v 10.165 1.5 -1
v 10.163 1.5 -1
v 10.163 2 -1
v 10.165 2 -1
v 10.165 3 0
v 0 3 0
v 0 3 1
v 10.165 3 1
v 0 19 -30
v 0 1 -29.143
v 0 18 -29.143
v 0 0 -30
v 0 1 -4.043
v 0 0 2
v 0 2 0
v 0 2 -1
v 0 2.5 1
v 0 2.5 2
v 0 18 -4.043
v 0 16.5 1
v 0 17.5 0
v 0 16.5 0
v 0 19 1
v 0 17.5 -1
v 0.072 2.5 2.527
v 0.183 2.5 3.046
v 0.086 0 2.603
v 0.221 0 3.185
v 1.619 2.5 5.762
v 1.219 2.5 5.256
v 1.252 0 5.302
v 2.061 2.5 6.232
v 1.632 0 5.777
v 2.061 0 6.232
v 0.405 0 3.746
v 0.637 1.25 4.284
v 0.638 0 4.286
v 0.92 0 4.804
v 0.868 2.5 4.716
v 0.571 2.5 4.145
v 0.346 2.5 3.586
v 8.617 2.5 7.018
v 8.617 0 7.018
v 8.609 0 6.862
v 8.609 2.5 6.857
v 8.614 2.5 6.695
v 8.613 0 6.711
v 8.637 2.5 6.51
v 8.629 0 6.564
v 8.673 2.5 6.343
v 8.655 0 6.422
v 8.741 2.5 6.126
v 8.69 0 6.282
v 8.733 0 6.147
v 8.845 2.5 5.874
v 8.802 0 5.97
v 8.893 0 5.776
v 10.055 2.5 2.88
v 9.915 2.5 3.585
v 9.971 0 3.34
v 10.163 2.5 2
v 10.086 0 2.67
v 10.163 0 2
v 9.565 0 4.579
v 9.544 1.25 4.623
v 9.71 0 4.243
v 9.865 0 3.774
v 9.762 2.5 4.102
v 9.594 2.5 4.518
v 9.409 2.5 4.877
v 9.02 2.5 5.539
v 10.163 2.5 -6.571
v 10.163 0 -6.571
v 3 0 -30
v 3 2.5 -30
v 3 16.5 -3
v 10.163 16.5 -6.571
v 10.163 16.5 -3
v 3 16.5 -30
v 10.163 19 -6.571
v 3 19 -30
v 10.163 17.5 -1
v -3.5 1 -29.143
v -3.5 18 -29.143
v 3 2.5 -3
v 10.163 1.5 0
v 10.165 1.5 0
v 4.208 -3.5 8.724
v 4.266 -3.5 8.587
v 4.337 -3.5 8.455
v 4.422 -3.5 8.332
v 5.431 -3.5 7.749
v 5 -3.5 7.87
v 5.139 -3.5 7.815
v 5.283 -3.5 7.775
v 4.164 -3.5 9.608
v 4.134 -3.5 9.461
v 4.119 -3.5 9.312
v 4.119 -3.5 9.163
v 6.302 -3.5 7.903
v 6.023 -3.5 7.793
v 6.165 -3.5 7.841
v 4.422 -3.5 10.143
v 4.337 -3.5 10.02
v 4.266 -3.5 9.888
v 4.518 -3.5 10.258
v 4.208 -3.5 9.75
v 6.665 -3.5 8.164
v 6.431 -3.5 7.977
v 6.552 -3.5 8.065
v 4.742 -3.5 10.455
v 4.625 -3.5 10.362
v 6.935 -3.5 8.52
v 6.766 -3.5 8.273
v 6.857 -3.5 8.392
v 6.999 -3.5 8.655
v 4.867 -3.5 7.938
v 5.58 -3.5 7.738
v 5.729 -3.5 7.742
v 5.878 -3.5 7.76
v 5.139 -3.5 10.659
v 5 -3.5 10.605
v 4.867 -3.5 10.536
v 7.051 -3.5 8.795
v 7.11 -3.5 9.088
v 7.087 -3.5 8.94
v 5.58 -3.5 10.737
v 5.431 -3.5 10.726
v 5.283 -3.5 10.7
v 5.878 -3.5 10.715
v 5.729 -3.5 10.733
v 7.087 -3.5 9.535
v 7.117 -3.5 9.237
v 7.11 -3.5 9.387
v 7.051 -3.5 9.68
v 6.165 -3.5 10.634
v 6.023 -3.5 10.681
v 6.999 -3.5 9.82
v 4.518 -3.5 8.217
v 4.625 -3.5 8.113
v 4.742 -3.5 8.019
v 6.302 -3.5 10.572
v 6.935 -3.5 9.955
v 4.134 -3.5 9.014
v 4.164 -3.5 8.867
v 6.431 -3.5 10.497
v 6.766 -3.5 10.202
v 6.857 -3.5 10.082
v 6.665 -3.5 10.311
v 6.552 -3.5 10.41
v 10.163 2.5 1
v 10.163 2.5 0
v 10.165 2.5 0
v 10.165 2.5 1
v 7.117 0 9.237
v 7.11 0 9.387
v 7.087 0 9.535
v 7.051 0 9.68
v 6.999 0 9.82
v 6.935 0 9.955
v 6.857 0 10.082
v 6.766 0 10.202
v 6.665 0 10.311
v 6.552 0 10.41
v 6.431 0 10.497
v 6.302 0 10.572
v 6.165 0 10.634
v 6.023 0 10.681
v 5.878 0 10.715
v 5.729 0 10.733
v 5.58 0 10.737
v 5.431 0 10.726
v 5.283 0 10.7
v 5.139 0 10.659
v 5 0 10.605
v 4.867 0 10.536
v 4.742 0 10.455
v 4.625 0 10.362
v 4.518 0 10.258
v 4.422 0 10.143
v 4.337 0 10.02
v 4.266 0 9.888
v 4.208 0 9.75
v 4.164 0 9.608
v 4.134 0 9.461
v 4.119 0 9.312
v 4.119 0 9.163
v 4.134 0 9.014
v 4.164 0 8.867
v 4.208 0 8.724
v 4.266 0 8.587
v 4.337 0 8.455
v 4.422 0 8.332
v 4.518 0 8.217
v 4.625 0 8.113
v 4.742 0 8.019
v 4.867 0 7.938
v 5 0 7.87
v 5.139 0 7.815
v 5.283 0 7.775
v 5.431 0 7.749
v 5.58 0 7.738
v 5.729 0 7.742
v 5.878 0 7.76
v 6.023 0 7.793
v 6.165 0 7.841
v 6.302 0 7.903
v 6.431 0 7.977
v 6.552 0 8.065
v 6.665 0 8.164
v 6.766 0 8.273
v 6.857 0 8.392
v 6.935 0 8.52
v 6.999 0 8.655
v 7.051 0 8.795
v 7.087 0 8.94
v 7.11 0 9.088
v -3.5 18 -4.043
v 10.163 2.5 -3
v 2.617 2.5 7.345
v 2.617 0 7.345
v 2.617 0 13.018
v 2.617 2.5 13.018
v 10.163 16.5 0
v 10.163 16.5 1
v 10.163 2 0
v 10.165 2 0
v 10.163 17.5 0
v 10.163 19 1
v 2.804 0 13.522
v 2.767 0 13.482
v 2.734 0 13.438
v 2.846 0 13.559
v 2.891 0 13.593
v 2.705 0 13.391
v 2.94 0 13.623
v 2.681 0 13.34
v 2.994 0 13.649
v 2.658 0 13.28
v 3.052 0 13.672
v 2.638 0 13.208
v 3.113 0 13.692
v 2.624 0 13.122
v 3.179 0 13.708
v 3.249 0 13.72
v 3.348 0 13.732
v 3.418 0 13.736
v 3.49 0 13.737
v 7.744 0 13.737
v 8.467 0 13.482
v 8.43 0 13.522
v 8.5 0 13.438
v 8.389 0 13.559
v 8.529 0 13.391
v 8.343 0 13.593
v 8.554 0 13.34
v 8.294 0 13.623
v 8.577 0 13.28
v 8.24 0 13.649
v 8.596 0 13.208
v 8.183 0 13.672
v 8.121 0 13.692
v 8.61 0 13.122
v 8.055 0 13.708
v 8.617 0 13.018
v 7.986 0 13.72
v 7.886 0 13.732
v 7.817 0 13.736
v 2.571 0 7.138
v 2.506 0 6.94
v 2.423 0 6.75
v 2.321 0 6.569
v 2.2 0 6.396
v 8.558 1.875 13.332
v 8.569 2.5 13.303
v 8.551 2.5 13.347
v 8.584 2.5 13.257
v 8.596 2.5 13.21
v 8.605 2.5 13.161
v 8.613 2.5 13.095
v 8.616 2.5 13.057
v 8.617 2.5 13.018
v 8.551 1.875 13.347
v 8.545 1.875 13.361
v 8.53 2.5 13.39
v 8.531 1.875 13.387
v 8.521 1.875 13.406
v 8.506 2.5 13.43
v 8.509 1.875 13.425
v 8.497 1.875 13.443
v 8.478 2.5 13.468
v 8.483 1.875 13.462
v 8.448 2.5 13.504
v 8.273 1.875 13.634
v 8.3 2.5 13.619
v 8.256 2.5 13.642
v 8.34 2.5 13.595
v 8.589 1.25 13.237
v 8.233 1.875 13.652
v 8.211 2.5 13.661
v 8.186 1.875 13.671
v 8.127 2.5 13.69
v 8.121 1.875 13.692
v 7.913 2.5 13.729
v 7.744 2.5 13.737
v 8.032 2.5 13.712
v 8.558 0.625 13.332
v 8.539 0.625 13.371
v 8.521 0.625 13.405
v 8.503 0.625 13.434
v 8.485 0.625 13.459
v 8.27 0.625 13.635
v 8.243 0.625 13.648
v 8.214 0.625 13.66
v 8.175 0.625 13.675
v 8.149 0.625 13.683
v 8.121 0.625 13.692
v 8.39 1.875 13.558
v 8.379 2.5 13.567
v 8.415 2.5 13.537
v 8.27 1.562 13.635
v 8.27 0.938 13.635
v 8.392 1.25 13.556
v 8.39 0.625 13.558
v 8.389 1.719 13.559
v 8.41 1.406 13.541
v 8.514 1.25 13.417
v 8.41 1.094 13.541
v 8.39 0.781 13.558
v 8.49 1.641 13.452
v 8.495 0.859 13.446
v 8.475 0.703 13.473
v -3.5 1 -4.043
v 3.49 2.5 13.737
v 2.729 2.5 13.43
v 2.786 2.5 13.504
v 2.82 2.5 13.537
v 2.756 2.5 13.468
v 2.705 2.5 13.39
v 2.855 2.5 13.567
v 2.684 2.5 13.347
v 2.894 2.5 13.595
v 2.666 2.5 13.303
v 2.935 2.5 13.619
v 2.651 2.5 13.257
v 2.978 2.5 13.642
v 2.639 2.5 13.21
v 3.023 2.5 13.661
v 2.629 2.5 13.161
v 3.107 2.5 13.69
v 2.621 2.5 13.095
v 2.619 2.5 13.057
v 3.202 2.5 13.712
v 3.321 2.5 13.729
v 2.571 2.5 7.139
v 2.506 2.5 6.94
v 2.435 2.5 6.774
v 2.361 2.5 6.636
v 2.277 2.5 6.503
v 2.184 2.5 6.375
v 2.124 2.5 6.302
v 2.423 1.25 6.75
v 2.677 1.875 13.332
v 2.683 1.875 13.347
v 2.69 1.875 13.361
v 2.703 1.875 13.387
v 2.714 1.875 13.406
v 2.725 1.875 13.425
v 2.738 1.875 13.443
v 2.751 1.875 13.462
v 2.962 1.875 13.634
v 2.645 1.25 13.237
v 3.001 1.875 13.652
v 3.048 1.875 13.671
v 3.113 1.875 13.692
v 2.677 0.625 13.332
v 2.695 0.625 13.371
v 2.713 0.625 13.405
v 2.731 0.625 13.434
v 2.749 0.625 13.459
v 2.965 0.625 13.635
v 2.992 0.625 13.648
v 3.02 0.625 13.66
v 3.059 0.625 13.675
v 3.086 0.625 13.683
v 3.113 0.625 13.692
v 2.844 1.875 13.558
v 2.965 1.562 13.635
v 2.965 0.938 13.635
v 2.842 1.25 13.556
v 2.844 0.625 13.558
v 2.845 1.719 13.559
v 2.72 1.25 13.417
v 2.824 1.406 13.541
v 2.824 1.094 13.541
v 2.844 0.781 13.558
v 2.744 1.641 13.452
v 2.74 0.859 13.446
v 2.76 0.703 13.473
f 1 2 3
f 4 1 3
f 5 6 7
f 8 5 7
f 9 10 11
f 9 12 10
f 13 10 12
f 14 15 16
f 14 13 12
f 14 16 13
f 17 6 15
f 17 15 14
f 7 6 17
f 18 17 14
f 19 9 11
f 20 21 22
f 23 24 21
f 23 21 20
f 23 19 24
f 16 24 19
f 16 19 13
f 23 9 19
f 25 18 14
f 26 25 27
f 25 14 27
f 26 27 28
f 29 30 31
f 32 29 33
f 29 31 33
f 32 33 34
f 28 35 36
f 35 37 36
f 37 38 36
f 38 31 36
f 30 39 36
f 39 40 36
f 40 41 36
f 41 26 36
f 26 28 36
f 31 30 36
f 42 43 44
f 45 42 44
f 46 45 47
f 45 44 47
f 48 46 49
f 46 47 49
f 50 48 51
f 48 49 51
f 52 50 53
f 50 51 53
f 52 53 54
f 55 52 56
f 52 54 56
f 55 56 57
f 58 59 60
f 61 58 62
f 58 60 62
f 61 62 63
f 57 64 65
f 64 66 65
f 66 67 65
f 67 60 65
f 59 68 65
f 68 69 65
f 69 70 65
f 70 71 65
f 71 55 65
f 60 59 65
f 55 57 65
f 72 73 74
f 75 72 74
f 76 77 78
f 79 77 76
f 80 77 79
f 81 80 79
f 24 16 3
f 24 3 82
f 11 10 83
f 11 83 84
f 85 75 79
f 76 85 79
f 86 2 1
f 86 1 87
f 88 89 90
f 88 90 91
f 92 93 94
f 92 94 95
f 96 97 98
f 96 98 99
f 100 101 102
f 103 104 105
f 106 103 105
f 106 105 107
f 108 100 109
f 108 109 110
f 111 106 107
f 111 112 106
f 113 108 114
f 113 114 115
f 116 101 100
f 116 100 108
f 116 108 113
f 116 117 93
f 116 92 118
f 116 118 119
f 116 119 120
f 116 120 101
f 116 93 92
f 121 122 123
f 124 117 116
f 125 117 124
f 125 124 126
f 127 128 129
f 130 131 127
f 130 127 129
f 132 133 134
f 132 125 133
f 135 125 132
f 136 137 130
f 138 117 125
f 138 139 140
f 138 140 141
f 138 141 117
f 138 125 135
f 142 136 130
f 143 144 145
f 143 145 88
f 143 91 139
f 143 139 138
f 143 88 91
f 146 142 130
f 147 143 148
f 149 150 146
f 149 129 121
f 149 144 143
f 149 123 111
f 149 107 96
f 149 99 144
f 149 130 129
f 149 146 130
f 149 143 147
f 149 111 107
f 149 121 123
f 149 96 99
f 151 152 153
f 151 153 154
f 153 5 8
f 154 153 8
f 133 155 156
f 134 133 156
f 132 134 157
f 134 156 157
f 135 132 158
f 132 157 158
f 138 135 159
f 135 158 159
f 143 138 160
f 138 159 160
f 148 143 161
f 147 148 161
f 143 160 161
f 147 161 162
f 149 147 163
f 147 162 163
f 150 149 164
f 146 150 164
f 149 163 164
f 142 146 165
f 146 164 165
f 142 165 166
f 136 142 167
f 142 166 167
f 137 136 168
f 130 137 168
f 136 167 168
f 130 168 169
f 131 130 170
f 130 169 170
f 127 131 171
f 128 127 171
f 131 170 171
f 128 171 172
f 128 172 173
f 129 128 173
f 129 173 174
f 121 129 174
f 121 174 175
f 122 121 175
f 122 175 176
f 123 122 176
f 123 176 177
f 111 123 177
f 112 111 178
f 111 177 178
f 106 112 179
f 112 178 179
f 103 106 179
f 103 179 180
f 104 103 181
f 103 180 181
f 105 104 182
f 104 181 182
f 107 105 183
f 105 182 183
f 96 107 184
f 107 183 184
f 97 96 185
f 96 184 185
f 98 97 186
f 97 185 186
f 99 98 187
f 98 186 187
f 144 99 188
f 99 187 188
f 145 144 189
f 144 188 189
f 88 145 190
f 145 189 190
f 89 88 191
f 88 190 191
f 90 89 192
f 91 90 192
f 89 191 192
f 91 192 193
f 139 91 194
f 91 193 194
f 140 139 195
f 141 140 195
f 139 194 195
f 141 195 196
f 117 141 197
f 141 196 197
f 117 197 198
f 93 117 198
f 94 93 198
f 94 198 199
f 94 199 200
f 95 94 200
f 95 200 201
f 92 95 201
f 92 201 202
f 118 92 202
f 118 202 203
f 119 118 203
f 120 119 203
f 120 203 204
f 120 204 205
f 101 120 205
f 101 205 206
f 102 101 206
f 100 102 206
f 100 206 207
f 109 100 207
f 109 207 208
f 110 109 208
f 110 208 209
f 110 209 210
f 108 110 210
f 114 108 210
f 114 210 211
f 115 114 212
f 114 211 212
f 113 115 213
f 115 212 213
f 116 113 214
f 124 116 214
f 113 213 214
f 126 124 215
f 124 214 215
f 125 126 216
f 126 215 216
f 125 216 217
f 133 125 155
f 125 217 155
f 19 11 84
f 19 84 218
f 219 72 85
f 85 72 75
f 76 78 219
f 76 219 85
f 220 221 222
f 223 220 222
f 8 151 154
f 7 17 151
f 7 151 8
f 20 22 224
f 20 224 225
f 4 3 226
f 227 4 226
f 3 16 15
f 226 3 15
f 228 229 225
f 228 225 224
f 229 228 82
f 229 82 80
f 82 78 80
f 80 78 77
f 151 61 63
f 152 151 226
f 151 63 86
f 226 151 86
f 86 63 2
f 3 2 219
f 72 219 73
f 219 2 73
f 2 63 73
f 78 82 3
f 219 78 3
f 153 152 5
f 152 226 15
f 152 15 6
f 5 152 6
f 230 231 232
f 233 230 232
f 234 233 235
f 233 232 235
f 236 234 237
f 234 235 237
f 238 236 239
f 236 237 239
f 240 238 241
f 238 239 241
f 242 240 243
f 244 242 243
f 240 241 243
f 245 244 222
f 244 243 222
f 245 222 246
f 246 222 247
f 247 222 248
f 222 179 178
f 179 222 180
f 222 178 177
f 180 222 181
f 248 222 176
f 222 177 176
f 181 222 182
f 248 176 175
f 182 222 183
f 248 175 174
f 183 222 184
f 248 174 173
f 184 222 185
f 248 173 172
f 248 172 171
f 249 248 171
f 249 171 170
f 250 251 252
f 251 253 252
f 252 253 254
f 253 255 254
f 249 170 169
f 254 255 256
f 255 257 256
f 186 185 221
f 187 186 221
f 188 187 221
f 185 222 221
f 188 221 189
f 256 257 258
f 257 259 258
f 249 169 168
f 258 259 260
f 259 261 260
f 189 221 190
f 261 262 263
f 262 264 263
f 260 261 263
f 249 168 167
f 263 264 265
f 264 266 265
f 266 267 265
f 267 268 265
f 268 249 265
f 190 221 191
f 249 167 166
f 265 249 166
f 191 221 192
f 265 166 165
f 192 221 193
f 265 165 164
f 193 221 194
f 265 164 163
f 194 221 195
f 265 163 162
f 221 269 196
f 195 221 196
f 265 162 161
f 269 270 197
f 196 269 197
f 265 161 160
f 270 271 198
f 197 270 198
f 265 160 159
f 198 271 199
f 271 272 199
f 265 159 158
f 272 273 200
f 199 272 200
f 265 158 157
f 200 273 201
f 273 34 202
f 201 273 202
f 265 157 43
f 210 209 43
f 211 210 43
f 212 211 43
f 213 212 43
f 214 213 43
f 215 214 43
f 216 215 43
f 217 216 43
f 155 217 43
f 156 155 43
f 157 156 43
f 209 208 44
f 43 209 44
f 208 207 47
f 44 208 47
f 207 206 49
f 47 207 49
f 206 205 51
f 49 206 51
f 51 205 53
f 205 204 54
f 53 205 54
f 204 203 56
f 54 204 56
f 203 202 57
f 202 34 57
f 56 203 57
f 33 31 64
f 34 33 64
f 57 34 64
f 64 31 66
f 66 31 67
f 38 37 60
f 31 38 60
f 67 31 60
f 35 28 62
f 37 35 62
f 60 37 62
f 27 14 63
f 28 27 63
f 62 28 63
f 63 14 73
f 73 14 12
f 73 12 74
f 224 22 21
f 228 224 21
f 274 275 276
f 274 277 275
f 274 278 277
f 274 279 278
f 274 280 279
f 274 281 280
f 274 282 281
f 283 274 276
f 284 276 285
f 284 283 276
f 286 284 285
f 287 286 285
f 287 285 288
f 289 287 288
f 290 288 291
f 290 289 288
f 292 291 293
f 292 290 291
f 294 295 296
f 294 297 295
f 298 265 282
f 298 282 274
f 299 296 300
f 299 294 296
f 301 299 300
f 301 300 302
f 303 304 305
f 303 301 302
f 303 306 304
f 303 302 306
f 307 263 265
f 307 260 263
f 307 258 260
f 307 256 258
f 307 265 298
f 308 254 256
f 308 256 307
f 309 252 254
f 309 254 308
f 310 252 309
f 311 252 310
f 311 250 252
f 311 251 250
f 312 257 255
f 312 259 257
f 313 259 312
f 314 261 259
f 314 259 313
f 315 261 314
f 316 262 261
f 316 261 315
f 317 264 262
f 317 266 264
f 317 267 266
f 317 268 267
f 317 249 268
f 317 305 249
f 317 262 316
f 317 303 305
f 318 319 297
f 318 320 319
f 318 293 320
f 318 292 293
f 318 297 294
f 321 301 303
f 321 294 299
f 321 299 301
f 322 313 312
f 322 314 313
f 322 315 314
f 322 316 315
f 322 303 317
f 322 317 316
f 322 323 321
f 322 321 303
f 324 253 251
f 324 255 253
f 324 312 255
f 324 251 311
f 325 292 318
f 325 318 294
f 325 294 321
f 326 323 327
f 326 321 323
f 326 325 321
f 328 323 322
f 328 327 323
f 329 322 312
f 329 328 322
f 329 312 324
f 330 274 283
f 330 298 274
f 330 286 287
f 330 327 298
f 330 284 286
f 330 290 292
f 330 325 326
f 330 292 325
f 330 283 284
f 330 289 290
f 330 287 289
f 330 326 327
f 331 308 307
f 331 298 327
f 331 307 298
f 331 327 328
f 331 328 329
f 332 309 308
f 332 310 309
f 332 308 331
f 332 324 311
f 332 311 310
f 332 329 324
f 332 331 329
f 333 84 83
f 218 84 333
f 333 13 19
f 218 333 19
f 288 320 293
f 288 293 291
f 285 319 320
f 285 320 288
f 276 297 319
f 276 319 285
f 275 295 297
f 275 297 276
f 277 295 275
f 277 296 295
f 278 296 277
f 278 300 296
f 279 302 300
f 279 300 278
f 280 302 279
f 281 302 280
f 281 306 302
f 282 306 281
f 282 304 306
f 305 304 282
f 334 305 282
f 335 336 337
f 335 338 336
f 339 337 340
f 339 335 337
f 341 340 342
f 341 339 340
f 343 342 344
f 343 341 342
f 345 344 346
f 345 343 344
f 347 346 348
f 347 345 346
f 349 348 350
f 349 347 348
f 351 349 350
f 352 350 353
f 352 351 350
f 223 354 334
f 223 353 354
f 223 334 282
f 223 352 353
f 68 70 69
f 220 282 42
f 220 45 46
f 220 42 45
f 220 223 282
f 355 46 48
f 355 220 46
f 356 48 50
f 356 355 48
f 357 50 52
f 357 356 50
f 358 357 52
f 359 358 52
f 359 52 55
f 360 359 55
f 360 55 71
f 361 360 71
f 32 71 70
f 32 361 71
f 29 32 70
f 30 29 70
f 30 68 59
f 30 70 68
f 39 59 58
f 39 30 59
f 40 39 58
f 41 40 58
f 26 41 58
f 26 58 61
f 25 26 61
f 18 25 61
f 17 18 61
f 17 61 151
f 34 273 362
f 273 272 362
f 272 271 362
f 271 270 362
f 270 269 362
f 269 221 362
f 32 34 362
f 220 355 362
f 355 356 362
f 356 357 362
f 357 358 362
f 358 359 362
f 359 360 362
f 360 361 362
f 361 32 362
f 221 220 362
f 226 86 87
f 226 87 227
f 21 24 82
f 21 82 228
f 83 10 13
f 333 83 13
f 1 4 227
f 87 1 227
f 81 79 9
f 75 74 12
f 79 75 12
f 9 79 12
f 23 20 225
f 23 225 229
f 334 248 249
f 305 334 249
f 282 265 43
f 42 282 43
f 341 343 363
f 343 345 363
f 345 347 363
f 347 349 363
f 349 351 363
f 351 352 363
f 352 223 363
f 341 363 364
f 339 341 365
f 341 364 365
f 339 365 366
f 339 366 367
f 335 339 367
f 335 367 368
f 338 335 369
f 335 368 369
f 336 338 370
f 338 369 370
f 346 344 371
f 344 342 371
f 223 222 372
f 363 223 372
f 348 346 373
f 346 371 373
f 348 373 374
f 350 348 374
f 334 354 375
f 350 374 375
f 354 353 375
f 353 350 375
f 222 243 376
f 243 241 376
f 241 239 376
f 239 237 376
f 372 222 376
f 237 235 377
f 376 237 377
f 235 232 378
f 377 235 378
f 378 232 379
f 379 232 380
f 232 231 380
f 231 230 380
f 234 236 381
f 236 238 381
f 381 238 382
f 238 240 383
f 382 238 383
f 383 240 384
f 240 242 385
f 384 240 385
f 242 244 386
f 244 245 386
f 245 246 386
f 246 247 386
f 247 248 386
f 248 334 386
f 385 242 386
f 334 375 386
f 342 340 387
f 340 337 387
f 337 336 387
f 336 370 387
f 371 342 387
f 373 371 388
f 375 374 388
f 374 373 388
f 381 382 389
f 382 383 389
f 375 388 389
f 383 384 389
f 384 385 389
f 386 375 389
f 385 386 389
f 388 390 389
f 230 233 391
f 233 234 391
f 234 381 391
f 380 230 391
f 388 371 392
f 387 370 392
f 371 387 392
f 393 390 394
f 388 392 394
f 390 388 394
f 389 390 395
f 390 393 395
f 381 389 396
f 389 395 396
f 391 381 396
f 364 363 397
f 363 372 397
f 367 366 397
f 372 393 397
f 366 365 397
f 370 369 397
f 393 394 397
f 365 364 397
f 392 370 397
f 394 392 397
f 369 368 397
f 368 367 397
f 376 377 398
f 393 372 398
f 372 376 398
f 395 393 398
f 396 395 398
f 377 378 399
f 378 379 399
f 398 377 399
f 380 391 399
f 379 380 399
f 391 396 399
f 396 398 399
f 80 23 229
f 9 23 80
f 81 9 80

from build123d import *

# Parameters (mm, degrees)
SALIENTE_EXTRUIR1_DEPTH = 19
CROQUIS2_W              = 9.87256946
CROQUIS2_H              = 14
CORTAR_EXTRUIR1_DEPTH   = 27
CROQUIS13_W             = 25.1
CROQUIS13_H             = 17
SALIENTE_EXTRUIR5_DEPTH = 3.5
CORTAR_EXTRUIR3_DEPTH   = 23
CROQUIS14_W             = 1
CROQUIS14_H             = 1
CORTAR_EXTRUIR4_DEPTH   = 23
CROQUIS15_R             = 1.5
SALIENTE_EXTRUIR6_DEPTH = 3.5
CROQUIS16_W             = 1
CROQUIS16_H             = 0.5
SALIENTE_EXTRUIR7_DEPTH = 10.165


with BuildPart() as part:
    # Croquis1 → Saliente-Extruir1 (new body)
    with BuildSketch(Plane(origin=(0, 0, 0), x_dir=(1, 0, 0), z_dir=(0, 1, 0))):
        with BuildLine():
            Line((0, 30), (0, 0))
            Line((0, 0), (0, -2))
            add(Edge.make_bspline(
                [(0, -2), (0.244064913, -4.453043064), (2.060905279, -6.231862145)],
                knots=[0, 0, 0, 1, 1, 1], degree=2))
            add(Edge.make_bspline(
                [(2.060905279, -6.231862145), (2.507004014, -6.712573557), (2.617207224, -7.344647716)],
                knots=[0, 0, 0, 1, 1, 1], degree=2))
            Line((2.617207224, -7.344647716), (2.617207224, -13.018311654))
            add(Edge.make_bspline(
                [(2.617207224, -13.018311654), (2.630895377, -13.73499915), (3.489917654, -13.737380921)],
                knots=[0, 0, 0, 1, 1, 1], degree=2))
            Line((3.489917654, -13.737380921), (7.744496795, -13.737380921))
            add(Edge.make_bspline(
                [(8.617207224, -13.018311654), (8.603519071, -13.73499915), (7.744496795, -13.737380921)],
                knots=[0, 0, 0, 1, 1, 1], degree=2))
            Line((8.617207224, -13.018311654), (8.617207224, -7.018311654))
            add(Edge.make_bspline(
                [(8.617207224, -7.018311654), (8.52941254, -6.066211773), (9.815332332, -4.707225326), (10.076873528, -2.886889338), (10.163106766, -2)],
                knots=[0, 0, 0, 0, 0.490316762, 1, 1, 1, 1], degree=3))
            Line((10.163106766, -2), (10.163106766, 0))
            Line((10.163106766, 0), (10.163106766, 6.570533479))
            Line((10.163106766, 6.570533479), (3, 30))
            Line((3, 30), (0, 30))
        make_face()
    extrude(amount=SALIENTE_EXTRUIR1_DEPTH)

    # Croquis2 → Cortar-Extruir1 (cut)
    with BuildSketch(Plane(origin=(0, 0, -30), x_dir=(-1, 0, 0), z_dir=(0, 0, -1))):
        with Locations((-7.93628473, 9.5)):
            Rectangle(CROQUIS2_W, CROQUIS2_H)
    extrude(amount=-CORTAR_EXTRUIR1_DEPTH, mode=Mode.SUBTRACT)

    # Croquis13 → Saliente-Extruir5 (add)
    with BuildSketch(Plane.ZY):
        with Locations((-16.592912937, 9.5)):
            Rectangle(CROQUIS13_W, CROQUIS13_H)
    extrude(amount=SALIENTE_EXTRUIR5_DEPTH)

    # Croquis10 → Cortar-Extruir3 (cut)
    with BuildSketch(Plane(origin=(0, 0, 0), x_dir=(0, 0, -1), z_dir=(1, 0, 0))):
        Polygon((1, 16.5), (-1, 16.5), (-1, 19), (-13.737380921, 19), (-13.737380921, 2.5), (-1, 2.5), (1, 2.5), align=None)
    extrude(amount=CORTAR_EXTRUIR3_DEPTH, mode=Mode.SUBTRACT)

    # Croquis14 → Cortar-Extruir4 (cut)
    with BuildSketch(Plane.ZY):
        with Locations((-0.5, 17)):
            Rectangle(CROQUIS14_W, CROQUIS14_H)
        with Locations((-0.5, 2)):
            Rectangle(CROQUIS14_W, CROQUIS14_H)
    extrude(amount=-CORTAR_EXTRUIR4_DEPTH, mode=Mode.SUBTRACT)

    # Croquis15 → Saliente-Extruir6 (add)
    with BuildSketch(Plane.XZ):
        with Locations((5.617207224, 9.237380921)):
            Circle(CROQUIS15_R)
    extrude(amount=SALIENTE_EXTRUIR6_DEPTH)

    # Croquis16 → Saliente-Extruir7 (add)
    with BuildSketch(Plane.ZY):
        with Locations((-0.5, 1.75)):
            Rectangle(CROQUIS16_W, CROQUIS16_H)
        with Locations((0.5, 2.75)):
            Rectangle(CROQUIS16_W, CROQUIS16_H)
    extrude(amount=-SALIENTE_EXTRUIR7_DEPTH)


solid = part.part
